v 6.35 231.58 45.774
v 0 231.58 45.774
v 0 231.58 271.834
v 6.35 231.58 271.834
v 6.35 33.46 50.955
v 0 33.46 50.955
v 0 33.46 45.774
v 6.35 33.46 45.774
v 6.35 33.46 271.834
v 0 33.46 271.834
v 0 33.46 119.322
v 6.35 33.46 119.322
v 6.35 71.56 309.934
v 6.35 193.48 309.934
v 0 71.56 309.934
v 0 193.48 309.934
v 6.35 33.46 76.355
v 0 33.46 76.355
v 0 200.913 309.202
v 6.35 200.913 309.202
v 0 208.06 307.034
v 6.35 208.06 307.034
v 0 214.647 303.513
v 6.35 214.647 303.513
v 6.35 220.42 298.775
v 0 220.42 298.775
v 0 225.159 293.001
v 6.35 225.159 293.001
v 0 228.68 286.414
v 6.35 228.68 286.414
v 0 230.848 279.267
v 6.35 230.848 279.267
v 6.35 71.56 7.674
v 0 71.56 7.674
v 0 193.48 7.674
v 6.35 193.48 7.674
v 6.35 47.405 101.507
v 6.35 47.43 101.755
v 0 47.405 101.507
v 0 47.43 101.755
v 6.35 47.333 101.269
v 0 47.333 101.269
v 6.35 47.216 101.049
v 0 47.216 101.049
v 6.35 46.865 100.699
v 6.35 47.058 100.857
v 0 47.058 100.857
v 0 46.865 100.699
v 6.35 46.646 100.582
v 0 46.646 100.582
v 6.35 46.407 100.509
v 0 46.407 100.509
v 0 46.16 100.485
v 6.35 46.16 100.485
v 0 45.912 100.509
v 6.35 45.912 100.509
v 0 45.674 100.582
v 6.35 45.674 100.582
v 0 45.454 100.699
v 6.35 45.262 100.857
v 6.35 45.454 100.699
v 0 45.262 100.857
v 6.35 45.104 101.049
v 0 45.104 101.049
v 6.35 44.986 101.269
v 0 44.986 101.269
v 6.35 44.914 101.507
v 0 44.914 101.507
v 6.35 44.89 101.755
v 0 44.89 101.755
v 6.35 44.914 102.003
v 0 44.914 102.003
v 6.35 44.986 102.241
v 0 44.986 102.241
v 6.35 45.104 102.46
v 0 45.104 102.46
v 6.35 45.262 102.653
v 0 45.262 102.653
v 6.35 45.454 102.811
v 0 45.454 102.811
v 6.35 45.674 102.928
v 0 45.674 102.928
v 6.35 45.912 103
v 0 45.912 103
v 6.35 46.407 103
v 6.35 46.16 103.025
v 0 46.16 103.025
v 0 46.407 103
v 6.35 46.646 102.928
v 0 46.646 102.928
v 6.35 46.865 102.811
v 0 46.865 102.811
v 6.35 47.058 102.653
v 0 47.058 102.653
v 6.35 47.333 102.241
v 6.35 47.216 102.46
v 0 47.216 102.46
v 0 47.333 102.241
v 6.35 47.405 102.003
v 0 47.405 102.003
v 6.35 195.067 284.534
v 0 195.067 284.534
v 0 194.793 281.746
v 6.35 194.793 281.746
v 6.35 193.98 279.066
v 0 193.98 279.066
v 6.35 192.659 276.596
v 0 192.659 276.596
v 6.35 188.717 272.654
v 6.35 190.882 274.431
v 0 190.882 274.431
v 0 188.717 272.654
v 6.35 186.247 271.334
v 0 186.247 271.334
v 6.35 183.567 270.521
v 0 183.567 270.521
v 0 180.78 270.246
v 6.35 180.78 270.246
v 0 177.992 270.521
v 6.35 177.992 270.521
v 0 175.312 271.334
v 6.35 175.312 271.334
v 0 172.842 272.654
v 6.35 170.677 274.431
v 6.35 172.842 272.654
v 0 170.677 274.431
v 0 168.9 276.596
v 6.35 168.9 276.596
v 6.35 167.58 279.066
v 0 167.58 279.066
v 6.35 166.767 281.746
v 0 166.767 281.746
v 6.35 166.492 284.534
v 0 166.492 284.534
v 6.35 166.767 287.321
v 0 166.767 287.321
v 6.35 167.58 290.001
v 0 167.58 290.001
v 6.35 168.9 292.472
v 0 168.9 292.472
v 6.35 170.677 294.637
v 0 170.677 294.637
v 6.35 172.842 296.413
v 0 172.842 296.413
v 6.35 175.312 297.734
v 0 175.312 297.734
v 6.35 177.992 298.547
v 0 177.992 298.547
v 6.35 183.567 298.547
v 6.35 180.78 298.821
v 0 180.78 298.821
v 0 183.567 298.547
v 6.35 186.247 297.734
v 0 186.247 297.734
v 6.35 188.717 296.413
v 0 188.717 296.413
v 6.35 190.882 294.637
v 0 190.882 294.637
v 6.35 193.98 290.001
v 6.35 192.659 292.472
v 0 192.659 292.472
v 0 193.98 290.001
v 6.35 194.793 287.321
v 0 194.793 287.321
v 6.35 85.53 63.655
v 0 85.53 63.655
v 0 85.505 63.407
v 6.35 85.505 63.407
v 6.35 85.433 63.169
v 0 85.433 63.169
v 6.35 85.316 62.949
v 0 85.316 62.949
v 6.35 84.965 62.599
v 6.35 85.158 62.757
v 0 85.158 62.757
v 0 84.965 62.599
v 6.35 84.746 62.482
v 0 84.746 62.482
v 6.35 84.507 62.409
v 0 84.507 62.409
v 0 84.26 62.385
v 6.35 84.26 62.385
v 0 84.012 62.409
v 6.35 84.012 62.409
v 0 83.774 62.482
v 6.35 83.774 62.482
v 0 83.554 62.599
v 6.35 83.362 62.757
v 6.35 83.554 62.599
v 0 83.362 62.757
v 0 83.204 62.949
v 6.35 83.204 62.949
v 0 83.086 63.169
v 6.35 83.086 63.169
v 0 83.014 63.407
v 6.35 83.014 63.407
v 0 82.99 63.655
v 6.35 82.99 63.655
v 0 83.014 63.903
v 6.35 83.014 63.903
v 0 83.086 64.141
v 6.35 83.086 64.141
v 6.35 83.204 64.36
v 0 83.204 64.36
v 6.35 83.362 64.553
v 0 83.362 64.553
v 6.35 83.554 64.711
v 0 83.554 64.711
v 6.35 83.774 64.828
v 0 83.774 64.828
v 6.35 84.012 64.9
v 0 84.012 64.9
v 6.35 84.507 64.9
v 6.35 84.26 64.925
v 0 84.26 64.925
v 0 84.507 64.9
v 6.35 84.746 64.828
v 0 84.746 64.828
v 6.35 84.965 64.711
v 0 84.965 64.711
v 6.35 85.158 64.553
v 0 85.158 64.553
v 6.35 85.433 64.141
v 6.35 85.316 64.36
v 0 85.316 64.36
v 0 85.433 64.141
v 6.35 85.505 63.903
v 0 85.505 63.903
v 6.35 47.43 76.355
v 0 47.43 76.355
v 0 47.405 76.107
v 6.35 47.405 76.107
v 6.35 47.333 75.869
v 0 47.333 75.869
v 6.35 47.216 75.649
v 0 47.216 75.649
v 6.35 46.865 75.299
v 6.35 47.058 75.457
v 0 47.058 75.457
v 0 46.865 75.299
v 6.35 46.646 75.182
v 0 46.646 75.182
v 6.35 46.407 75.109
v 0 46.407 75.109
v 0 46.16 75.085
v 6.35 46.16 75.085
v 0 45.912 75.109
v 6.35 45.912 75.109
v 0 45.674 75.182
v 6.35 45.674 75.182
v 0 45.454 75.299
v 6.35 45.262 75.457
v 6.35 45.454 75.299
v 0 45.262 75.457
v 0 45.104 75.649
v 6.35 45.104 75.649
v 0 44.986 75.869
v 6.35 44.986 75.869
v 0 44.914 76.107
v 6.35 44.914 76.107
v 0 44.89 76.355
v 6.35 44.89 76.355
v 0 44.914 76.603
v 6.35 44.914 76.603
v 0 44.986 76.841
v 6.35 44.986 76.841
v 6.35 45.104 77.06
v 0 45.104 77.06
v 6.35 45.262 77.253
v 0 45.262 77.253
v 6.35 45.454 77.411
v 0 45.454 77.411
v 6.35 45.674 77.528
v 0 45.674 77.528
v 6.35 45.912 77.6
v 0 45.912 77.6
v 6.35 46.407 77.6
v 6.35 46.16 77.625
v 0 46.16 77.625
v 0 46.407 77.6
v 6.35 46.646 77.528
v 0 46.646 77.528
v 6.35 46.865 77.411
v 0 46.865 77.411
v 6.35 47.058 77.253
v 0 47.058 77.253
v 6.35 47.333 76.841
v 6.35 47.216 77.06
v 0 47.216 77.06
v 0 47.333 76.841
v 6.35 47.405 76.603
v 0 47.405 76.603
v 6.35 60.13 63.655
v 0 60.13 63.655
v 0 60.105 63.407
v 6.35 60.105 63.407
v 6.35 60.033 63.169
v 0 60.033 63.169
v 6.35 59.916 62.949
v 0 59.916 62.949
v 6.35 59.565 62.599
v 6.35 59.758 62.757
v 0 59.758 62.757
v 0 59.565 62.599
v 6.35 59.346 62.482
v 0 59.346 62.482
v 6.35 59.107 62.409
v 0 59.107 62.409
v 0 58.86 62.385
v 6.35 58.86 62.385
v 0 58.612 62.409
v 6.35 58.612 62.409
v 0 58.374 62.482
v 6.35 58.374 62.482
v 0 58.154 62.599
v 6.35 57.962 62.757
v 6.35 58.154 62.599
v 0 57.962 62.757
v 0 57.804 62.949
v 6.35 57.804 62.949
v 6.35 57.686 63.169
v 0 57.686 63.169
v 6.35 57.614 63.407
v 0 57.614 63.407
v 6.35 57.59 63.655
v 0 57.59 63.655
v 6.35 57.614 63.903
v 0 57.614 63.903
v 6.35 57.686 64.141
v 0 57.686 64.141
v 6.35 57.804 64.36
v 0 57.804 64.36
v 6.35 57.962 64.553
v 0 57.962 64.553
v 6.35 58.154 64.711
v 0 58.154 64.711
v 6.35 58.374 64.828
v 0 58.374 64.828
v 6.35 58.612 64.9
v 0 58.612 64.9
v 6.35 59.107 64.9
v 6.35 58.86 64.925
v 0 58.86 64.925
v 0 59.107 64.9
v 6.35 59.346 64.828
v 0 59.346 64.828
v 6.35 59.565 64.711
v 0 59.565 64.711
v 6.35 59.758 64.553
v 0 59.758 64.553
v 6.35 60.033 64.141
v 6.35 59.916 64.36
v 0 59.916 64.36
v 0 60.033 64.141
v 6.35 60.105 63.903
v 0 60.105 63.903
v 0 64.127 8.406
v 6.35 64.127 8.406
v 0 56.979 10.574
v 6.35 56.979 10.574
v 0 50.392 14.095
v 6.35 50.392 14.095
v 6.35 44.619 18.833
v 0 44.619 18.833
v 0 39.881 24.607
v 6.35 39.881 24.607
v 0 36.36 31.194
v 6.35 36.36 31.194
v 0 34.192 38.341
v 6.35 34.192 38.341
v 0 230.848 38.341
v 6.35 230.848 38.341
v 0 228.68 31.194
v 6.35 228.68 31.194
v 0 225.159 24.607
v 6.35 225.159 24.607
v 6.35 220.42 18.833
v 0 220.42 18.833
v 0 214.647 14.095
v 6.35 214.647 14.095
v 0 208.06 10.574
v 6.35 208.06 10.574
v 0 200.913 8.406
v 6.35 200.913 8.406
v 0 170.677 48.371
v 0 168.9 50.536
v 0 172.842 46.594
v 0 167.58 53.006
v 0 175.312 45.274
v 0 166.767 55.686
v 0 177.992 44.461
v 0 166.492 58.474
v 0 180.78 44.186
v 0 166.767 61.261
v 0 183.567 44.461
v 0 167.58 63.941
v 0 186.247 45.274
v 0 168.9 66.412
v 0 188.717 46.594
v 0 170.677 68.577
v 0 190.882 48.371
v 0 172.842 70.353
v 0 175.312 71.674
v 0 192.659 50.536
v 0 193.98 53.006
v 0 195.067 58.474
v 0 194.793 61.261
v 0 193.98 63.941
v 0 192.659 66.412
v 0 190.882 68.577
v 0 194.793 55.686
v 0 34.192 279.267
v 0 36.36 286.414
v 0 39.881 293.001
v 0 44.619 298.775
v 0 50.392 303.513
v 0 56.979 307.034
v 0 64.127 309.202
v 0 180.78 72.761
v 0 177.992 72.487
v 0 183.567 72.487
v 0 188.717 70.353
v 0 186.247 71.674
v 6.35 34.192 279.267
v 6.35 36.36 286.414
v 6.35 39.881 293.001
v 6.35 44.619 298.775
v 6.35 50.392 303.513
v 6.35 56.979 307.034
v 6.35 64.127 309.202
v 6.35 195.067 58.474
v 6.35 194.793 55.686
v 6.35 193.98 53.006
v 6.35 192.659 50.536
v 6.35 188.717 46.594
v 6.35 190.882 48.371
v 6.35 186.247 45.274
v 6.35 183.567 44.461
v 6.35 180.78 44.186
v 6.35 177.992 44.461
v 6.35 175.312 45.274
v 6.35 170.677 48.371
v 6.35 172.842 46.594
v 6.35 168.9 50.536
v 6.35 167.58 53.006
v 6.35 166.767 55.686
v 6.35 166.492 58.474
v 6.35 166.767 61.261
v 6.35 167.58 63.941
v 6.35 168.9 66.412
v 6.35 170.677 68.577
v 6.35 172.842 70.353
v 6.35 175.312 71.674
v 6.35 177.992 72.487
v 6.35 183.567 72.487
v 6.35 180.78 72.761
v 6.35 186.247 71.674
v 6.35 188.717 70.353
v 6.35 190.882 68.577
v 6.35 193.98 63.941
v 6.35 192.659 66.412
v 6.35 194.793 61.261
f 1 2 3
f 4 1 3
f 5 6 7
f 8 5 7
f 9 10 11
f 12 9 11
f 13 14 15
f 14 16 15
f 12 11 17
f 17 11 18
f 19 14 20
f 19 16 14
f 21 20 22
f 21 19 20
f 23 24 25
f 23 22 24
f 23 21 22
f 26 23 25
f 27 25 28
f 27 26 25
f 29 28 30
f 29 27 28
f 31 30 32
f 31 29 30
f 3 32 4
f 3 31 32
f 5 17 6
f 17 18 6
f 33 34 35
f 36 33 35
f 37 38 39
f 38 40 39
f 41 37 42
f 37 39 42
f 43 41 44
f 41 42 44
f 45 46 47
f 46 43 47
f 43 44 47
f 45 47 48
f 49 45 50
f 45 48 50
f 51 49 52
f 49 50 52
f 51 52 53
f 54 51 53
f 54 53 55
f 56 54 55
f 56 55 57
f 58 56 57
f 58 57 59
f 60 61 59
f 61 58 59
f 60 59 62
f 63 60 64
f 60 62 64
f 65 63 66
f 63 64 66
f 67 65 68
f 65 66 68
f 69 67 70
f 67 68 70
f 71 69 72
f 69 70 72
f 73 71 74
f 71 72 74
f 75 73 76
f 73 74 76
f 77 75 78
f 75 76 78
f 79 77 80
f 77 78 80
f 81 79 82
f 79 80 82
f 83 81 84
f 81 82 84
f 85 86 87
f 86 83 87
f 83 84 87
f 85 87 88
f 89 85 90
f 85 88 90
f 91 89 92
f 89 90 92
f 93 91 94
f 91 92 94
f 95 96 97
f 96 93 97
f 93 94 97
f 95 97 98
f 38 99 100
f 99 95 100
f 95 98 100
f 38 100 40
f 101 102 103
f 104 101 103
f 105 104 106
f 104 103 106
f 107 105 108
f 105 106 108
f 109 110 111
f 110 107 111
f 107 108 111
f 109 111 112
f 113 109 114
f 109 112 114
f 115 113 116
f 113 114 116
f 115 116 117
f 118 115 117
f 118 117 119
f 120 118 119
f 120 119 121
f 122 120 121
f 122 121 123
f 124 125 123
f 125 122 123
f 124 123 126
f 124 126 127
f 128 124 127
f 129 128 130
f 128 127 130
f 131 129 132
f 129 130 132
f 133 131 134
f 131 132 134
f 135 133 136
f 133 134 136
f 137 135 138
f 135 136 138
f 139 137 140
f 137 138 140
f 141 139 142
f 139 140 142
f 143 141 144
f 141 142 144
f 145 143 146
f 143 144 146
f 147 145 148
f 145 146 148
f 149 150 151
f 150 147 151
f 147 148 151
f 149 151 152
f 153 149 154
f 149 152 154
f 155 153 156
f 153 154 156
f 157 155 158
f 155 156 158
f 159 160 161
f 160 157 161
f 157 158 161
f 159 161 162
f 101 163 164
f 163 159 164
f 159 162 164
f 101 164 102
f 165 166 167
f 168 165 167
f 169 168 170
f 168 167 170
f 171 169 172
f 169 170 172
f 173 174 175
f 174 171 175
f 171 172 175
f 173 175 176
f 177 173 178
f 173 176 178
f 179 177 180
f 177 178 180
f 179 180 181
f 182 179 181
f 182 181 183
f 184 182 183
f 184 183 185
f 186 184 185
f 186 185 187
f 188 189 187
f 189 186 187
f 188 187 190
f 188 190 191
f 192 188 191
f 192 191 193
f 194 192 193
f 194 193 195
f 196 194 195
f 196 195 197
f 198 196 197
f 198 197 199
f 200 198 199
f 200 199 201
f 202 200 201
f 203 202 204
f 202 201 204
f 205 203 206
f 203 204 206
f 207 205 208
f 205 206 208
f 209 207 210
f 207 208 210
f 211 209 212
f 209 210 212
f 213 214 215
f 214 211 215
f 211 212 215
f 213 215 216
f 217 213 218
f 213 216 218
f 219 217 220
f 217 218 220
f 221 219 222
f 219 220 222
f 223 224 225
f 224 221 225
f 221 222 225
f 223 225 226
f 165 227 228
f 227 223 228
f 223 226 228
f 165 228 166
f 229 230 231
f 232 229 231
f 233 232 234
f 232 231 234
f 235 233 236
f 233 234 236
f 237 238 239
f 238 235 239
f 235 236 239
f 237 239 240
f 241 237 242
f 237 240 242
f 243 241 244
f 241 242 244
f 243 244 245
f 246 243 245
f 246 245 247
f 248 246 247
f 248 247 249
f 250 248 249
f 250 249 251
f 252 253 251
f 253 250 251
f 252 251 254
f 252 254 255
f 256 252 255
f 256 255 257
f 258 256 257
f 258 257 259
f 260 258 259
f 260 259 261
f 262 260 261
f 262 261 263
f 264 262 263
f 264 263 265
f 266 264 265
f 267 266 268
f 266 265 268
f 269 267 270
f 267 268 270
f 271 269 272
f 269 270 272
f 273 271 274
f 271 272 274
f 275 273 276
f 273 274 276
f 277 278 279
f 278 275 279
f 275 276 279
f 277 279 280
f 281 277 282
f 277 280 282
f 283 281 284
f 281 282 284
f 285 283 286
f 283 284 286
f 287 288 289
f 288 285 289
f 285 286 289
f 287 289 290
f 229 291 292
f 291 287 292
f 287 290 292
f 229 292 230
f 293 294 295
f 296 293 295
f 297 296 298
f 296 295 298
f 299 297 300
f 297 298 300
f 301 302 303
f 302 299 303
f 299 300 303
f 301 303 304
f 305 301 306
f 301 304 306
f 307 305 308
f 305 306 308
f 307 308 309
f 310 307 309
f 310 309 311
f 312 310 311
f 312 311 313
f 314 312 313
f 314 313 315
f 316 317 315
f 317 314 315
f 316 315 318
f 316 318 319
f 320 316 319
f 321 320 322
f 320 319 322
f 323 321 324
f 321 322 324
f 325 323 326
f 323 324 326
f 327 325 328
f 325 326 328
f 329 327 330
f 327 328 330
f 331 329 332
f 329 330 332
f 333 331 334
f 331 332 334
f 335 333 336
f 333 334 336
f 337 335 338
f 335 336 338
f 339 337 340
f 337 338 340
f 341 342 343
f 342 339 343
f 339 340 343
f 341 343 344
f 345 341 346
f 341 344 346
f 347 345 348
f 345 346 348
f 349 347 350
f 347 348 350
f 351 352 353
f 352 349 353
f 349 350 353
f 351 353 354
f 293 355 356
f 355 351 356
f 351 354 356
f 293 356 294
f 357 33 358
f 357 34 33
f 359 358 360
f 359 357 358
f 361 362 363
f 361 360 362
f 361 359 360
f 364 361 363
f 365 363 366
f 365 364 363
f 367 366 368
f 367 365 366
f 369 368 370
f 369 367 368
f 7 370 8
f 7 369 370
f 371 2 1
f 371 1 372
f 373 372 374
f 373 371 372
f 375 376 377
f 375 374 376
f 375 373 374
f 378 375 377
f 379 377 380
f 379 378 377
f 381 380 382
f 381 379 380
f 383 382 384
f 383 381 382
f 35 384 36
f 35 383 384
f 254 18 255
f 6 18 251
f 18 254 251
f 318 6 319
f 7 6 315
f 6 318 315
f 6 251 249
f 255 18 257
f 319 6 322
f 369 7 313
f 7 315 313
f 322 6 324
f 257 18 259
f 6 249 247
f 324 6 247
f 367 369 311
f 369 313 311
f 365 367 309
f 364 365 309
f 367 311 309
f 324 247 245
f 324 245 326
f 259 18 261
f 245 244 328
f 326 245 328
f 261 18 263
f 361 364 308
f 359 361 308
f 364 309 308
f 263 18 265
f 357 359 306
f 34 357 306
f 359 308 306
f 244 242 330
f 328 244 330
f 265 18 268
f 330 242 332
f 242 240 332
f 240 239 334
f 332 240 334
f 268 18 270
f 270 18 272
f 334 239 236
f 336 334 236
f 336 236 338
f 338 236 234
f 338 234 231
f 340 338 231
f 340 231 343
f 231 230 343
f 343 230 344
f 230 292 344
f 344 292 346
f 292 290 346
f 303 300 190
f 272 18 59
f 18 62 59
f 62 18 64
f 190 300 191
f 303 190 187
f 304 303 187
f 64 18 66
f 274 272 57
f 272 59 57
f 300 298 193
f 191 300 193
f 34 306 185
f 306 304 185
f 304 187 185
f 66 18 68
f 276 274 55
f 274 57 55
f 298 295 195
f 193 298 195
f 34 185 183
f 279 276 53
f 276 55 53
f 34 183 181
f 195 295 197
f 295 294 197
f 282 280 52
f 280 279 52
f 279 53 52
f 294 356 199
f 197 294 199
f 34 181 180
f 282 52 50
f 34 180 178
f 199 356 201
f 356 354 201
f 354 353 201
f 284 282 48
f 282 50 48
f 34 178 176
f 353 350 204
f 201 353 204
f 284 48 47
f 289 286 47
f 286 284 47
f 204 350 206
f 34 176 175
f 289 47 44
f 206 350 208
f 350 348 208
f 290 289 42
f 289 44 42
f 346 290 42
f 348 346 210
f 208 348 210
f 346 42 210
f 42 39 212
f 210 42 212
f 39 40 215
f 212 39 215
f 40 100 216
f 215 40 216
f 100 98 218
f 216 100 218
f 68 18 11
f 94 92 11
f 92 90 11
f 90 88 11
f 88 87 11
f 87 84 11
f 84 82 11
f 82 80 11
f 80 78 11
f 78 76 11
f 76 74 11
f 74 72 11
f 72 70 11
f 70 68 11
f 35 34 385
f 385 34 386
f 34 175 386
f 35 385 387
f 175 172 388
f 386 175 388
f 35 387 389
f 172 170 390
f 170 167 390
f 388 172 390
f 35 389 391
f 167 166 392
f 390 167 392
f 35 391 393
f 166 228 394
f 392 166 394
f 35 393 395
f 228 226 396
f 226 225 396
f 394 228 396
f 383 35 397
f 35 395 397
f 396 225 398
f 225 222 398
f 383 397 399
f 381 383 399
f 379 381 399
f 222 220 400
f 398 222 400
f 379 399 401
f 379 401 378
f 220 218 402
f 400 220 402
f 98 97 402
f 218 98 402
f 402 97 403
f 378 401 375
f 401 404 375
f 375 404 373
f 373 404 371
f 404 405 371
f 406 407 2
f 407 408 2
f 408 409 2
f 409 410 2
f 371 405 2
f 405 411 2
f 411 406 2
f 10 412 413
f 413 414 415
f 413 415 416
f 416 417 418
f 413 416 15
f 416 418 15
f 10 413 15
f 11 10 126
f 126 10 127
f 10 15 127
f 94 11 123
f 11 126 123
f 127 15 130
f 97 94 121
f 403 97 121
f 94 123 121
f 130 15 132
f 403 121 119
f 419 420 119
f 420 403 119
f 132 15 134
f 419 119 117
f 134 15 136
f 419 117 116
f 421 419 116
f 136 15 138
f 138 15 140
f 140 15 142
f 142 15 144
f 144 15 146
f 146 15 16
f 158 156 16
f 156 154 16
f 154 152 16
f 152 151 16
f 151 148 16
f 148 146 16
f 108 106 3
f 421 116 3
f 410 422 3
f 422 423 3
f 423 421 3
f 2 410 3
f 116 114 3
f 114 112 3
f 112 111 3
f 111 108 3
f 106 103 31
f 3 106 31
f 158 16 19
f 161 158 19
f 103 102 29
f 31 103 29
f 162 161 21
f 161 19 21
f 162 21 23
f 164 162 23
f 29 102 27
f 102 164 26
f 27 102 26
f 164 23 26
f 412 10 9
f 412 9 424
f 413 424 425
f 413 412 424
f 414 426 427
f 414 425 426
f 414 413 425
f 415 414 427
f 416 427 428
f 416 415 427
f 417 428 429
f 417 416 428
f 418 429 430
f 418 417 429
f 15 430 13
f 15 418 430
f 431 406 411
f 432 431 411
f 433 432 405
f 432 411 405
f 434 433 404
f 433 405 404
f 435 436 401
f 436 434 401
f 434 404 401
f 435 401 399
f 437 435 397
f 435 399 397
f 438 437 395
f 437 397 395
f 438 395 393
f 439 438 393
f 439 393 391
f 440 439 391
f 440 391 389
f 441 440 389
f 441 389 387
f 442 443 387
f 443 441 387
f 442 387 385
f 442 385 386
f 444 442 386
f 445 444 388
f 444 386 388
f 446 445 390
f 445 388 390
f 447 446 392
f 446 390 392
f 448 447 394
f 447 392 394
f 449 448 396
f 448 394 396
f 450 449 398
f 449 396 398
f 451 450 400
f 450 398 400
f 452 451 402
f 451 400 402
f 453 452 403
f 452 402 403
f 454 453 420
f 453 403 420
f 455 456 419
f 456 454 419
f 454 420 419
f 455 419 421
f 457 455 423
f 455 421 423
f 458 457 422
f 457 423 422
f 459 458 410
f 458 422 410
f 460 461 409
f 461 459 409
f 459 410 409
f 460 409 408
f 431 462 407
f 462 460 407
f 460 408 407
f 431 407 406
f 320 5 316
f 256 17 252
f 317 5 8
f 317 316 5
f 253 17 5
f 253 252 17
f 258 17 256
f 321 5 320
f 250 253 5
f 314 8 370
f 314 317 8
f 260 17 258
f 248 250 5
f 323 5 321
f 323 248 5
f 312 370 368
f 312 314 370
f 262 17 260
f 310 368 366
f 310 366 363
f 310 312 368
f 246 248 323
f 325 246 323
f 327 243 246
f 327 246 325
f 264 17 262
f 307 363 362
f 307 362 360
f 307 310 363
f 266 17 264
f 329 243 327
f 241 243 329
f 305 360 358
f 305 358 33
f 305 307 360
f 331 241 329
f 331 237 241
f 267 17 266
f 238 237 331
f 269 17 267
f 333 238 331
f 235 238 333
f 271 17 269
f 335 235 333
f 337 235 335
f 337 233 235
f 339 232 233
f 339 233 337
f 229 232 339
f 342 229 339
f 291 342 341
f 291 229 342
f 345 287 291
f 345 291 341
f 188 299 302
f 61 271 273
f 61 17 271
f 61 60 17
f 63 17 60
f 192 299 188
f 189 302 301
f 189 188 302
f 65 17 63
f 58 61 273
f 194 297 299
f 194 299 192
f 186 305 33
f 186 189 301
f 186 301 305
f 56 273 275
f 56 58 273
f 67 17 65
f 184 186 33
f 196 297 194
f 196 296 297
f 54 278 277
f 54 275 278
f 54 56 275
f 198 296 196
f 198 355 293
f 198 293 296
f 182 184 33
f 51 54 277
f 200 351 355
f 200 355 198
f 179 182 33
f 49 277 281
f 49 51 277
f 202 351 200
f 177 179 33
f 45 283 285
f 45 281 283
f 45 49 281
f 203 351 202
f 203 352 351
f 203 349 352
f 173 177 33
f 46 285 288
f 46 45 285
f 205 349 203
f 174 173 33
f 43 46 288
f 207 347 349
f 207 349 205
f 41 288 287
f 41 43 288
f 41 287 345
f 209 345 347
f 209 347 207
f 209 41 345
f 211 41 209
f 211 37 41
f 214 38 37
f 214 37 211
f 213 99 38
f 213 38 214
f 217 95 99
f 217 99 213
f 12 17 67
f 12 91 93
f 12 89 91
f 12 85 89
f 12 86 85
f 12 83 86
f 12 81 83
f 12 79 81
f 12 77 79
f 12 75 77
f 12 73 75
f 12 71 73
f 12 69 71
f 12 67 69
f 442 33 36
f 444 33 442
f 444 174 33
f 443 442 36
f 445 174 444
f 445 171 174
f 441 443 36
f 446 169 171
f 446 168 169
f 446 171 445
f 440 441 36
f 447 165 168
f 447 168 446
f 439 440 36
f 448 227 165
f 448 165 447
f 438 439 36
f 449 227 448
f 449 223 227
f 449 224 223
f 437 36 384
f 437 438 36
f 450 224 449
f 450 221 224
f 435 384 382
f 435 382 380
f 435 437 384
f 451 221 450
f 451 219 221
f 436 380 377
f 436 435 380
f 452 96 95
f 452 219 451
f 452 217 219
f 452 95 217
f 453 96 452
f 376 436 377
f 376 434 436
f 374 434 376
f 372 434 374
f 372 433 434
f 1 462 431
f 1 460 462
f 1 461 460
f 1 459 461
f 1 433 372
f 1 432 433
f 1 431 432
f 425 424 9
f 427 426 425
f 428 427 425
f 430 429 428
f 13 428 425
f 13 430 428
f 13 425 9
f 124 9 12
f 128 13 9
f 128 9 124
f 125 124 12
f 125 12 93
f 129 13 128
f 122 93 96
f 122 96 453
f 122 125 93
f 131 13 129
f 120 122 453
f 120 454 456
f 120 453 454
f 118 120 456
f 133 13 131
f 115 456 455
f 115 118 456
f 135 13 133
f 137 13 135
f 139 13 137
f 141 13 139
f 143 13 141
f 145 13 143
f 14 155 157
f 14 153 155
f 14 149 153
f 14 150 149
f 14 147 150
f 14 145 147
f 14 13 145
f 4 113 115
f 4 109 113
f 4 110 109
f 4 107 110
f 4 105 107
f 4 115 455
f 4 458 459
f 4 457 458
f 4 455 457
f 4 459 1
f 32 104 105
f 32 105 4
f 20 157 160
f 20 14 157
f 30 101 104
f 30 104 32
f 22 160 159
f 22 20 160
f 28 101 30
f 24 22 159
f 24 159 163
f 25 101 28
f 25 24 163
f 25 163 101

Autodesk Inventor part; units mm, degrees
ref_plane "YZ Plane" through (0, 0, 0) normal (1, 0, 0) x (0, 1, 0)
ref_plane "XZ Plane" through (0, 0, 0) normal (0, 1, 0) x (-1, 0, 0)
ref_plane "XY Plane" through (0, 0, 0) normal (0, 0, 1) x (1, 0, 0)
sketch "Sketch1" plane through (0, 0, 0) normal (1, 0, 0) x (0, 1, 0)
  line L0 (-17.3403, 309.9338) -> (-51.2615, 309.9338)
  line L1 (-51.2615, -502.8662) -> (-17.3403, -502.8662)
  line L2 (71.5597, 7.6738) -> (193.4797, 7.6738)
  line L3 (231.5797, 45.7738) -> (231.5797, 271.8338)
  line L4 (193.4797, 309.9338) -> (71.5597, 309.9338)
  line L5 (33.4597, 271.8338) -> (33.4597, 45.7738)
  line L6 (33.4597, 50.9549) -> (33.4597, 76.3549)
  line L7 (33.4597, 119.3221) -> (33.4597, 50.9549)
  arc A0 (71.5597, 309.9338) -> (33.4597, 271.8338) centre (71.5597, 271.8338) ccw
  arc A1 (231.5797, 271.8338) -> (193.4797, 309.9338) centre (193.4797, 271.8338) ccw
  arc A2 (193.4797, 7.6738) -> (231.5797, 45.7738) centre (193.4797, 45.7738) ccw
  arc A3 (33.4597, 45.7738) -> (71.5597, 7.6738) centre (71.5597, 45.7738) ccw
  circle A4 centre (180.7797, 284.5338) radius 14.2875
  circle A5 centre (46.1597, 76.3549) radius 1.27
  circle A6 centre (46.1597, 101.7549) radius 1.27
  circle A7 centre (58.8597, 63.6549) radius 1.27
  circle A8 centre (84.2597, 63.6549) radius 1.27
  circle A9 centre (180.7797, 58.4738) radius 14.2875
  point P0 (0, 0)
  dimension "d2" = 812.8
  dimension "d17" = 302.26
  dimension "d28" = 38.1
  dimension "d29" = 28.575
  dimension "d30" = 2.54
  dimension "d32" = 12.7
  dimension "d33" = 2.54
  dimension "d34" = 12.7
  dimension "d35" = 25.4
  dimension "d36" = 0
  dimension "d37" = 2.54
  dimension "d38" = 2.54
  dimension "d40" = 25.4
  dimension "d42" = 28.575
extrude "Extrusion1" add sketch "Sketch1" along normal blind 6.35
properties part number "BottomRampPlate"
